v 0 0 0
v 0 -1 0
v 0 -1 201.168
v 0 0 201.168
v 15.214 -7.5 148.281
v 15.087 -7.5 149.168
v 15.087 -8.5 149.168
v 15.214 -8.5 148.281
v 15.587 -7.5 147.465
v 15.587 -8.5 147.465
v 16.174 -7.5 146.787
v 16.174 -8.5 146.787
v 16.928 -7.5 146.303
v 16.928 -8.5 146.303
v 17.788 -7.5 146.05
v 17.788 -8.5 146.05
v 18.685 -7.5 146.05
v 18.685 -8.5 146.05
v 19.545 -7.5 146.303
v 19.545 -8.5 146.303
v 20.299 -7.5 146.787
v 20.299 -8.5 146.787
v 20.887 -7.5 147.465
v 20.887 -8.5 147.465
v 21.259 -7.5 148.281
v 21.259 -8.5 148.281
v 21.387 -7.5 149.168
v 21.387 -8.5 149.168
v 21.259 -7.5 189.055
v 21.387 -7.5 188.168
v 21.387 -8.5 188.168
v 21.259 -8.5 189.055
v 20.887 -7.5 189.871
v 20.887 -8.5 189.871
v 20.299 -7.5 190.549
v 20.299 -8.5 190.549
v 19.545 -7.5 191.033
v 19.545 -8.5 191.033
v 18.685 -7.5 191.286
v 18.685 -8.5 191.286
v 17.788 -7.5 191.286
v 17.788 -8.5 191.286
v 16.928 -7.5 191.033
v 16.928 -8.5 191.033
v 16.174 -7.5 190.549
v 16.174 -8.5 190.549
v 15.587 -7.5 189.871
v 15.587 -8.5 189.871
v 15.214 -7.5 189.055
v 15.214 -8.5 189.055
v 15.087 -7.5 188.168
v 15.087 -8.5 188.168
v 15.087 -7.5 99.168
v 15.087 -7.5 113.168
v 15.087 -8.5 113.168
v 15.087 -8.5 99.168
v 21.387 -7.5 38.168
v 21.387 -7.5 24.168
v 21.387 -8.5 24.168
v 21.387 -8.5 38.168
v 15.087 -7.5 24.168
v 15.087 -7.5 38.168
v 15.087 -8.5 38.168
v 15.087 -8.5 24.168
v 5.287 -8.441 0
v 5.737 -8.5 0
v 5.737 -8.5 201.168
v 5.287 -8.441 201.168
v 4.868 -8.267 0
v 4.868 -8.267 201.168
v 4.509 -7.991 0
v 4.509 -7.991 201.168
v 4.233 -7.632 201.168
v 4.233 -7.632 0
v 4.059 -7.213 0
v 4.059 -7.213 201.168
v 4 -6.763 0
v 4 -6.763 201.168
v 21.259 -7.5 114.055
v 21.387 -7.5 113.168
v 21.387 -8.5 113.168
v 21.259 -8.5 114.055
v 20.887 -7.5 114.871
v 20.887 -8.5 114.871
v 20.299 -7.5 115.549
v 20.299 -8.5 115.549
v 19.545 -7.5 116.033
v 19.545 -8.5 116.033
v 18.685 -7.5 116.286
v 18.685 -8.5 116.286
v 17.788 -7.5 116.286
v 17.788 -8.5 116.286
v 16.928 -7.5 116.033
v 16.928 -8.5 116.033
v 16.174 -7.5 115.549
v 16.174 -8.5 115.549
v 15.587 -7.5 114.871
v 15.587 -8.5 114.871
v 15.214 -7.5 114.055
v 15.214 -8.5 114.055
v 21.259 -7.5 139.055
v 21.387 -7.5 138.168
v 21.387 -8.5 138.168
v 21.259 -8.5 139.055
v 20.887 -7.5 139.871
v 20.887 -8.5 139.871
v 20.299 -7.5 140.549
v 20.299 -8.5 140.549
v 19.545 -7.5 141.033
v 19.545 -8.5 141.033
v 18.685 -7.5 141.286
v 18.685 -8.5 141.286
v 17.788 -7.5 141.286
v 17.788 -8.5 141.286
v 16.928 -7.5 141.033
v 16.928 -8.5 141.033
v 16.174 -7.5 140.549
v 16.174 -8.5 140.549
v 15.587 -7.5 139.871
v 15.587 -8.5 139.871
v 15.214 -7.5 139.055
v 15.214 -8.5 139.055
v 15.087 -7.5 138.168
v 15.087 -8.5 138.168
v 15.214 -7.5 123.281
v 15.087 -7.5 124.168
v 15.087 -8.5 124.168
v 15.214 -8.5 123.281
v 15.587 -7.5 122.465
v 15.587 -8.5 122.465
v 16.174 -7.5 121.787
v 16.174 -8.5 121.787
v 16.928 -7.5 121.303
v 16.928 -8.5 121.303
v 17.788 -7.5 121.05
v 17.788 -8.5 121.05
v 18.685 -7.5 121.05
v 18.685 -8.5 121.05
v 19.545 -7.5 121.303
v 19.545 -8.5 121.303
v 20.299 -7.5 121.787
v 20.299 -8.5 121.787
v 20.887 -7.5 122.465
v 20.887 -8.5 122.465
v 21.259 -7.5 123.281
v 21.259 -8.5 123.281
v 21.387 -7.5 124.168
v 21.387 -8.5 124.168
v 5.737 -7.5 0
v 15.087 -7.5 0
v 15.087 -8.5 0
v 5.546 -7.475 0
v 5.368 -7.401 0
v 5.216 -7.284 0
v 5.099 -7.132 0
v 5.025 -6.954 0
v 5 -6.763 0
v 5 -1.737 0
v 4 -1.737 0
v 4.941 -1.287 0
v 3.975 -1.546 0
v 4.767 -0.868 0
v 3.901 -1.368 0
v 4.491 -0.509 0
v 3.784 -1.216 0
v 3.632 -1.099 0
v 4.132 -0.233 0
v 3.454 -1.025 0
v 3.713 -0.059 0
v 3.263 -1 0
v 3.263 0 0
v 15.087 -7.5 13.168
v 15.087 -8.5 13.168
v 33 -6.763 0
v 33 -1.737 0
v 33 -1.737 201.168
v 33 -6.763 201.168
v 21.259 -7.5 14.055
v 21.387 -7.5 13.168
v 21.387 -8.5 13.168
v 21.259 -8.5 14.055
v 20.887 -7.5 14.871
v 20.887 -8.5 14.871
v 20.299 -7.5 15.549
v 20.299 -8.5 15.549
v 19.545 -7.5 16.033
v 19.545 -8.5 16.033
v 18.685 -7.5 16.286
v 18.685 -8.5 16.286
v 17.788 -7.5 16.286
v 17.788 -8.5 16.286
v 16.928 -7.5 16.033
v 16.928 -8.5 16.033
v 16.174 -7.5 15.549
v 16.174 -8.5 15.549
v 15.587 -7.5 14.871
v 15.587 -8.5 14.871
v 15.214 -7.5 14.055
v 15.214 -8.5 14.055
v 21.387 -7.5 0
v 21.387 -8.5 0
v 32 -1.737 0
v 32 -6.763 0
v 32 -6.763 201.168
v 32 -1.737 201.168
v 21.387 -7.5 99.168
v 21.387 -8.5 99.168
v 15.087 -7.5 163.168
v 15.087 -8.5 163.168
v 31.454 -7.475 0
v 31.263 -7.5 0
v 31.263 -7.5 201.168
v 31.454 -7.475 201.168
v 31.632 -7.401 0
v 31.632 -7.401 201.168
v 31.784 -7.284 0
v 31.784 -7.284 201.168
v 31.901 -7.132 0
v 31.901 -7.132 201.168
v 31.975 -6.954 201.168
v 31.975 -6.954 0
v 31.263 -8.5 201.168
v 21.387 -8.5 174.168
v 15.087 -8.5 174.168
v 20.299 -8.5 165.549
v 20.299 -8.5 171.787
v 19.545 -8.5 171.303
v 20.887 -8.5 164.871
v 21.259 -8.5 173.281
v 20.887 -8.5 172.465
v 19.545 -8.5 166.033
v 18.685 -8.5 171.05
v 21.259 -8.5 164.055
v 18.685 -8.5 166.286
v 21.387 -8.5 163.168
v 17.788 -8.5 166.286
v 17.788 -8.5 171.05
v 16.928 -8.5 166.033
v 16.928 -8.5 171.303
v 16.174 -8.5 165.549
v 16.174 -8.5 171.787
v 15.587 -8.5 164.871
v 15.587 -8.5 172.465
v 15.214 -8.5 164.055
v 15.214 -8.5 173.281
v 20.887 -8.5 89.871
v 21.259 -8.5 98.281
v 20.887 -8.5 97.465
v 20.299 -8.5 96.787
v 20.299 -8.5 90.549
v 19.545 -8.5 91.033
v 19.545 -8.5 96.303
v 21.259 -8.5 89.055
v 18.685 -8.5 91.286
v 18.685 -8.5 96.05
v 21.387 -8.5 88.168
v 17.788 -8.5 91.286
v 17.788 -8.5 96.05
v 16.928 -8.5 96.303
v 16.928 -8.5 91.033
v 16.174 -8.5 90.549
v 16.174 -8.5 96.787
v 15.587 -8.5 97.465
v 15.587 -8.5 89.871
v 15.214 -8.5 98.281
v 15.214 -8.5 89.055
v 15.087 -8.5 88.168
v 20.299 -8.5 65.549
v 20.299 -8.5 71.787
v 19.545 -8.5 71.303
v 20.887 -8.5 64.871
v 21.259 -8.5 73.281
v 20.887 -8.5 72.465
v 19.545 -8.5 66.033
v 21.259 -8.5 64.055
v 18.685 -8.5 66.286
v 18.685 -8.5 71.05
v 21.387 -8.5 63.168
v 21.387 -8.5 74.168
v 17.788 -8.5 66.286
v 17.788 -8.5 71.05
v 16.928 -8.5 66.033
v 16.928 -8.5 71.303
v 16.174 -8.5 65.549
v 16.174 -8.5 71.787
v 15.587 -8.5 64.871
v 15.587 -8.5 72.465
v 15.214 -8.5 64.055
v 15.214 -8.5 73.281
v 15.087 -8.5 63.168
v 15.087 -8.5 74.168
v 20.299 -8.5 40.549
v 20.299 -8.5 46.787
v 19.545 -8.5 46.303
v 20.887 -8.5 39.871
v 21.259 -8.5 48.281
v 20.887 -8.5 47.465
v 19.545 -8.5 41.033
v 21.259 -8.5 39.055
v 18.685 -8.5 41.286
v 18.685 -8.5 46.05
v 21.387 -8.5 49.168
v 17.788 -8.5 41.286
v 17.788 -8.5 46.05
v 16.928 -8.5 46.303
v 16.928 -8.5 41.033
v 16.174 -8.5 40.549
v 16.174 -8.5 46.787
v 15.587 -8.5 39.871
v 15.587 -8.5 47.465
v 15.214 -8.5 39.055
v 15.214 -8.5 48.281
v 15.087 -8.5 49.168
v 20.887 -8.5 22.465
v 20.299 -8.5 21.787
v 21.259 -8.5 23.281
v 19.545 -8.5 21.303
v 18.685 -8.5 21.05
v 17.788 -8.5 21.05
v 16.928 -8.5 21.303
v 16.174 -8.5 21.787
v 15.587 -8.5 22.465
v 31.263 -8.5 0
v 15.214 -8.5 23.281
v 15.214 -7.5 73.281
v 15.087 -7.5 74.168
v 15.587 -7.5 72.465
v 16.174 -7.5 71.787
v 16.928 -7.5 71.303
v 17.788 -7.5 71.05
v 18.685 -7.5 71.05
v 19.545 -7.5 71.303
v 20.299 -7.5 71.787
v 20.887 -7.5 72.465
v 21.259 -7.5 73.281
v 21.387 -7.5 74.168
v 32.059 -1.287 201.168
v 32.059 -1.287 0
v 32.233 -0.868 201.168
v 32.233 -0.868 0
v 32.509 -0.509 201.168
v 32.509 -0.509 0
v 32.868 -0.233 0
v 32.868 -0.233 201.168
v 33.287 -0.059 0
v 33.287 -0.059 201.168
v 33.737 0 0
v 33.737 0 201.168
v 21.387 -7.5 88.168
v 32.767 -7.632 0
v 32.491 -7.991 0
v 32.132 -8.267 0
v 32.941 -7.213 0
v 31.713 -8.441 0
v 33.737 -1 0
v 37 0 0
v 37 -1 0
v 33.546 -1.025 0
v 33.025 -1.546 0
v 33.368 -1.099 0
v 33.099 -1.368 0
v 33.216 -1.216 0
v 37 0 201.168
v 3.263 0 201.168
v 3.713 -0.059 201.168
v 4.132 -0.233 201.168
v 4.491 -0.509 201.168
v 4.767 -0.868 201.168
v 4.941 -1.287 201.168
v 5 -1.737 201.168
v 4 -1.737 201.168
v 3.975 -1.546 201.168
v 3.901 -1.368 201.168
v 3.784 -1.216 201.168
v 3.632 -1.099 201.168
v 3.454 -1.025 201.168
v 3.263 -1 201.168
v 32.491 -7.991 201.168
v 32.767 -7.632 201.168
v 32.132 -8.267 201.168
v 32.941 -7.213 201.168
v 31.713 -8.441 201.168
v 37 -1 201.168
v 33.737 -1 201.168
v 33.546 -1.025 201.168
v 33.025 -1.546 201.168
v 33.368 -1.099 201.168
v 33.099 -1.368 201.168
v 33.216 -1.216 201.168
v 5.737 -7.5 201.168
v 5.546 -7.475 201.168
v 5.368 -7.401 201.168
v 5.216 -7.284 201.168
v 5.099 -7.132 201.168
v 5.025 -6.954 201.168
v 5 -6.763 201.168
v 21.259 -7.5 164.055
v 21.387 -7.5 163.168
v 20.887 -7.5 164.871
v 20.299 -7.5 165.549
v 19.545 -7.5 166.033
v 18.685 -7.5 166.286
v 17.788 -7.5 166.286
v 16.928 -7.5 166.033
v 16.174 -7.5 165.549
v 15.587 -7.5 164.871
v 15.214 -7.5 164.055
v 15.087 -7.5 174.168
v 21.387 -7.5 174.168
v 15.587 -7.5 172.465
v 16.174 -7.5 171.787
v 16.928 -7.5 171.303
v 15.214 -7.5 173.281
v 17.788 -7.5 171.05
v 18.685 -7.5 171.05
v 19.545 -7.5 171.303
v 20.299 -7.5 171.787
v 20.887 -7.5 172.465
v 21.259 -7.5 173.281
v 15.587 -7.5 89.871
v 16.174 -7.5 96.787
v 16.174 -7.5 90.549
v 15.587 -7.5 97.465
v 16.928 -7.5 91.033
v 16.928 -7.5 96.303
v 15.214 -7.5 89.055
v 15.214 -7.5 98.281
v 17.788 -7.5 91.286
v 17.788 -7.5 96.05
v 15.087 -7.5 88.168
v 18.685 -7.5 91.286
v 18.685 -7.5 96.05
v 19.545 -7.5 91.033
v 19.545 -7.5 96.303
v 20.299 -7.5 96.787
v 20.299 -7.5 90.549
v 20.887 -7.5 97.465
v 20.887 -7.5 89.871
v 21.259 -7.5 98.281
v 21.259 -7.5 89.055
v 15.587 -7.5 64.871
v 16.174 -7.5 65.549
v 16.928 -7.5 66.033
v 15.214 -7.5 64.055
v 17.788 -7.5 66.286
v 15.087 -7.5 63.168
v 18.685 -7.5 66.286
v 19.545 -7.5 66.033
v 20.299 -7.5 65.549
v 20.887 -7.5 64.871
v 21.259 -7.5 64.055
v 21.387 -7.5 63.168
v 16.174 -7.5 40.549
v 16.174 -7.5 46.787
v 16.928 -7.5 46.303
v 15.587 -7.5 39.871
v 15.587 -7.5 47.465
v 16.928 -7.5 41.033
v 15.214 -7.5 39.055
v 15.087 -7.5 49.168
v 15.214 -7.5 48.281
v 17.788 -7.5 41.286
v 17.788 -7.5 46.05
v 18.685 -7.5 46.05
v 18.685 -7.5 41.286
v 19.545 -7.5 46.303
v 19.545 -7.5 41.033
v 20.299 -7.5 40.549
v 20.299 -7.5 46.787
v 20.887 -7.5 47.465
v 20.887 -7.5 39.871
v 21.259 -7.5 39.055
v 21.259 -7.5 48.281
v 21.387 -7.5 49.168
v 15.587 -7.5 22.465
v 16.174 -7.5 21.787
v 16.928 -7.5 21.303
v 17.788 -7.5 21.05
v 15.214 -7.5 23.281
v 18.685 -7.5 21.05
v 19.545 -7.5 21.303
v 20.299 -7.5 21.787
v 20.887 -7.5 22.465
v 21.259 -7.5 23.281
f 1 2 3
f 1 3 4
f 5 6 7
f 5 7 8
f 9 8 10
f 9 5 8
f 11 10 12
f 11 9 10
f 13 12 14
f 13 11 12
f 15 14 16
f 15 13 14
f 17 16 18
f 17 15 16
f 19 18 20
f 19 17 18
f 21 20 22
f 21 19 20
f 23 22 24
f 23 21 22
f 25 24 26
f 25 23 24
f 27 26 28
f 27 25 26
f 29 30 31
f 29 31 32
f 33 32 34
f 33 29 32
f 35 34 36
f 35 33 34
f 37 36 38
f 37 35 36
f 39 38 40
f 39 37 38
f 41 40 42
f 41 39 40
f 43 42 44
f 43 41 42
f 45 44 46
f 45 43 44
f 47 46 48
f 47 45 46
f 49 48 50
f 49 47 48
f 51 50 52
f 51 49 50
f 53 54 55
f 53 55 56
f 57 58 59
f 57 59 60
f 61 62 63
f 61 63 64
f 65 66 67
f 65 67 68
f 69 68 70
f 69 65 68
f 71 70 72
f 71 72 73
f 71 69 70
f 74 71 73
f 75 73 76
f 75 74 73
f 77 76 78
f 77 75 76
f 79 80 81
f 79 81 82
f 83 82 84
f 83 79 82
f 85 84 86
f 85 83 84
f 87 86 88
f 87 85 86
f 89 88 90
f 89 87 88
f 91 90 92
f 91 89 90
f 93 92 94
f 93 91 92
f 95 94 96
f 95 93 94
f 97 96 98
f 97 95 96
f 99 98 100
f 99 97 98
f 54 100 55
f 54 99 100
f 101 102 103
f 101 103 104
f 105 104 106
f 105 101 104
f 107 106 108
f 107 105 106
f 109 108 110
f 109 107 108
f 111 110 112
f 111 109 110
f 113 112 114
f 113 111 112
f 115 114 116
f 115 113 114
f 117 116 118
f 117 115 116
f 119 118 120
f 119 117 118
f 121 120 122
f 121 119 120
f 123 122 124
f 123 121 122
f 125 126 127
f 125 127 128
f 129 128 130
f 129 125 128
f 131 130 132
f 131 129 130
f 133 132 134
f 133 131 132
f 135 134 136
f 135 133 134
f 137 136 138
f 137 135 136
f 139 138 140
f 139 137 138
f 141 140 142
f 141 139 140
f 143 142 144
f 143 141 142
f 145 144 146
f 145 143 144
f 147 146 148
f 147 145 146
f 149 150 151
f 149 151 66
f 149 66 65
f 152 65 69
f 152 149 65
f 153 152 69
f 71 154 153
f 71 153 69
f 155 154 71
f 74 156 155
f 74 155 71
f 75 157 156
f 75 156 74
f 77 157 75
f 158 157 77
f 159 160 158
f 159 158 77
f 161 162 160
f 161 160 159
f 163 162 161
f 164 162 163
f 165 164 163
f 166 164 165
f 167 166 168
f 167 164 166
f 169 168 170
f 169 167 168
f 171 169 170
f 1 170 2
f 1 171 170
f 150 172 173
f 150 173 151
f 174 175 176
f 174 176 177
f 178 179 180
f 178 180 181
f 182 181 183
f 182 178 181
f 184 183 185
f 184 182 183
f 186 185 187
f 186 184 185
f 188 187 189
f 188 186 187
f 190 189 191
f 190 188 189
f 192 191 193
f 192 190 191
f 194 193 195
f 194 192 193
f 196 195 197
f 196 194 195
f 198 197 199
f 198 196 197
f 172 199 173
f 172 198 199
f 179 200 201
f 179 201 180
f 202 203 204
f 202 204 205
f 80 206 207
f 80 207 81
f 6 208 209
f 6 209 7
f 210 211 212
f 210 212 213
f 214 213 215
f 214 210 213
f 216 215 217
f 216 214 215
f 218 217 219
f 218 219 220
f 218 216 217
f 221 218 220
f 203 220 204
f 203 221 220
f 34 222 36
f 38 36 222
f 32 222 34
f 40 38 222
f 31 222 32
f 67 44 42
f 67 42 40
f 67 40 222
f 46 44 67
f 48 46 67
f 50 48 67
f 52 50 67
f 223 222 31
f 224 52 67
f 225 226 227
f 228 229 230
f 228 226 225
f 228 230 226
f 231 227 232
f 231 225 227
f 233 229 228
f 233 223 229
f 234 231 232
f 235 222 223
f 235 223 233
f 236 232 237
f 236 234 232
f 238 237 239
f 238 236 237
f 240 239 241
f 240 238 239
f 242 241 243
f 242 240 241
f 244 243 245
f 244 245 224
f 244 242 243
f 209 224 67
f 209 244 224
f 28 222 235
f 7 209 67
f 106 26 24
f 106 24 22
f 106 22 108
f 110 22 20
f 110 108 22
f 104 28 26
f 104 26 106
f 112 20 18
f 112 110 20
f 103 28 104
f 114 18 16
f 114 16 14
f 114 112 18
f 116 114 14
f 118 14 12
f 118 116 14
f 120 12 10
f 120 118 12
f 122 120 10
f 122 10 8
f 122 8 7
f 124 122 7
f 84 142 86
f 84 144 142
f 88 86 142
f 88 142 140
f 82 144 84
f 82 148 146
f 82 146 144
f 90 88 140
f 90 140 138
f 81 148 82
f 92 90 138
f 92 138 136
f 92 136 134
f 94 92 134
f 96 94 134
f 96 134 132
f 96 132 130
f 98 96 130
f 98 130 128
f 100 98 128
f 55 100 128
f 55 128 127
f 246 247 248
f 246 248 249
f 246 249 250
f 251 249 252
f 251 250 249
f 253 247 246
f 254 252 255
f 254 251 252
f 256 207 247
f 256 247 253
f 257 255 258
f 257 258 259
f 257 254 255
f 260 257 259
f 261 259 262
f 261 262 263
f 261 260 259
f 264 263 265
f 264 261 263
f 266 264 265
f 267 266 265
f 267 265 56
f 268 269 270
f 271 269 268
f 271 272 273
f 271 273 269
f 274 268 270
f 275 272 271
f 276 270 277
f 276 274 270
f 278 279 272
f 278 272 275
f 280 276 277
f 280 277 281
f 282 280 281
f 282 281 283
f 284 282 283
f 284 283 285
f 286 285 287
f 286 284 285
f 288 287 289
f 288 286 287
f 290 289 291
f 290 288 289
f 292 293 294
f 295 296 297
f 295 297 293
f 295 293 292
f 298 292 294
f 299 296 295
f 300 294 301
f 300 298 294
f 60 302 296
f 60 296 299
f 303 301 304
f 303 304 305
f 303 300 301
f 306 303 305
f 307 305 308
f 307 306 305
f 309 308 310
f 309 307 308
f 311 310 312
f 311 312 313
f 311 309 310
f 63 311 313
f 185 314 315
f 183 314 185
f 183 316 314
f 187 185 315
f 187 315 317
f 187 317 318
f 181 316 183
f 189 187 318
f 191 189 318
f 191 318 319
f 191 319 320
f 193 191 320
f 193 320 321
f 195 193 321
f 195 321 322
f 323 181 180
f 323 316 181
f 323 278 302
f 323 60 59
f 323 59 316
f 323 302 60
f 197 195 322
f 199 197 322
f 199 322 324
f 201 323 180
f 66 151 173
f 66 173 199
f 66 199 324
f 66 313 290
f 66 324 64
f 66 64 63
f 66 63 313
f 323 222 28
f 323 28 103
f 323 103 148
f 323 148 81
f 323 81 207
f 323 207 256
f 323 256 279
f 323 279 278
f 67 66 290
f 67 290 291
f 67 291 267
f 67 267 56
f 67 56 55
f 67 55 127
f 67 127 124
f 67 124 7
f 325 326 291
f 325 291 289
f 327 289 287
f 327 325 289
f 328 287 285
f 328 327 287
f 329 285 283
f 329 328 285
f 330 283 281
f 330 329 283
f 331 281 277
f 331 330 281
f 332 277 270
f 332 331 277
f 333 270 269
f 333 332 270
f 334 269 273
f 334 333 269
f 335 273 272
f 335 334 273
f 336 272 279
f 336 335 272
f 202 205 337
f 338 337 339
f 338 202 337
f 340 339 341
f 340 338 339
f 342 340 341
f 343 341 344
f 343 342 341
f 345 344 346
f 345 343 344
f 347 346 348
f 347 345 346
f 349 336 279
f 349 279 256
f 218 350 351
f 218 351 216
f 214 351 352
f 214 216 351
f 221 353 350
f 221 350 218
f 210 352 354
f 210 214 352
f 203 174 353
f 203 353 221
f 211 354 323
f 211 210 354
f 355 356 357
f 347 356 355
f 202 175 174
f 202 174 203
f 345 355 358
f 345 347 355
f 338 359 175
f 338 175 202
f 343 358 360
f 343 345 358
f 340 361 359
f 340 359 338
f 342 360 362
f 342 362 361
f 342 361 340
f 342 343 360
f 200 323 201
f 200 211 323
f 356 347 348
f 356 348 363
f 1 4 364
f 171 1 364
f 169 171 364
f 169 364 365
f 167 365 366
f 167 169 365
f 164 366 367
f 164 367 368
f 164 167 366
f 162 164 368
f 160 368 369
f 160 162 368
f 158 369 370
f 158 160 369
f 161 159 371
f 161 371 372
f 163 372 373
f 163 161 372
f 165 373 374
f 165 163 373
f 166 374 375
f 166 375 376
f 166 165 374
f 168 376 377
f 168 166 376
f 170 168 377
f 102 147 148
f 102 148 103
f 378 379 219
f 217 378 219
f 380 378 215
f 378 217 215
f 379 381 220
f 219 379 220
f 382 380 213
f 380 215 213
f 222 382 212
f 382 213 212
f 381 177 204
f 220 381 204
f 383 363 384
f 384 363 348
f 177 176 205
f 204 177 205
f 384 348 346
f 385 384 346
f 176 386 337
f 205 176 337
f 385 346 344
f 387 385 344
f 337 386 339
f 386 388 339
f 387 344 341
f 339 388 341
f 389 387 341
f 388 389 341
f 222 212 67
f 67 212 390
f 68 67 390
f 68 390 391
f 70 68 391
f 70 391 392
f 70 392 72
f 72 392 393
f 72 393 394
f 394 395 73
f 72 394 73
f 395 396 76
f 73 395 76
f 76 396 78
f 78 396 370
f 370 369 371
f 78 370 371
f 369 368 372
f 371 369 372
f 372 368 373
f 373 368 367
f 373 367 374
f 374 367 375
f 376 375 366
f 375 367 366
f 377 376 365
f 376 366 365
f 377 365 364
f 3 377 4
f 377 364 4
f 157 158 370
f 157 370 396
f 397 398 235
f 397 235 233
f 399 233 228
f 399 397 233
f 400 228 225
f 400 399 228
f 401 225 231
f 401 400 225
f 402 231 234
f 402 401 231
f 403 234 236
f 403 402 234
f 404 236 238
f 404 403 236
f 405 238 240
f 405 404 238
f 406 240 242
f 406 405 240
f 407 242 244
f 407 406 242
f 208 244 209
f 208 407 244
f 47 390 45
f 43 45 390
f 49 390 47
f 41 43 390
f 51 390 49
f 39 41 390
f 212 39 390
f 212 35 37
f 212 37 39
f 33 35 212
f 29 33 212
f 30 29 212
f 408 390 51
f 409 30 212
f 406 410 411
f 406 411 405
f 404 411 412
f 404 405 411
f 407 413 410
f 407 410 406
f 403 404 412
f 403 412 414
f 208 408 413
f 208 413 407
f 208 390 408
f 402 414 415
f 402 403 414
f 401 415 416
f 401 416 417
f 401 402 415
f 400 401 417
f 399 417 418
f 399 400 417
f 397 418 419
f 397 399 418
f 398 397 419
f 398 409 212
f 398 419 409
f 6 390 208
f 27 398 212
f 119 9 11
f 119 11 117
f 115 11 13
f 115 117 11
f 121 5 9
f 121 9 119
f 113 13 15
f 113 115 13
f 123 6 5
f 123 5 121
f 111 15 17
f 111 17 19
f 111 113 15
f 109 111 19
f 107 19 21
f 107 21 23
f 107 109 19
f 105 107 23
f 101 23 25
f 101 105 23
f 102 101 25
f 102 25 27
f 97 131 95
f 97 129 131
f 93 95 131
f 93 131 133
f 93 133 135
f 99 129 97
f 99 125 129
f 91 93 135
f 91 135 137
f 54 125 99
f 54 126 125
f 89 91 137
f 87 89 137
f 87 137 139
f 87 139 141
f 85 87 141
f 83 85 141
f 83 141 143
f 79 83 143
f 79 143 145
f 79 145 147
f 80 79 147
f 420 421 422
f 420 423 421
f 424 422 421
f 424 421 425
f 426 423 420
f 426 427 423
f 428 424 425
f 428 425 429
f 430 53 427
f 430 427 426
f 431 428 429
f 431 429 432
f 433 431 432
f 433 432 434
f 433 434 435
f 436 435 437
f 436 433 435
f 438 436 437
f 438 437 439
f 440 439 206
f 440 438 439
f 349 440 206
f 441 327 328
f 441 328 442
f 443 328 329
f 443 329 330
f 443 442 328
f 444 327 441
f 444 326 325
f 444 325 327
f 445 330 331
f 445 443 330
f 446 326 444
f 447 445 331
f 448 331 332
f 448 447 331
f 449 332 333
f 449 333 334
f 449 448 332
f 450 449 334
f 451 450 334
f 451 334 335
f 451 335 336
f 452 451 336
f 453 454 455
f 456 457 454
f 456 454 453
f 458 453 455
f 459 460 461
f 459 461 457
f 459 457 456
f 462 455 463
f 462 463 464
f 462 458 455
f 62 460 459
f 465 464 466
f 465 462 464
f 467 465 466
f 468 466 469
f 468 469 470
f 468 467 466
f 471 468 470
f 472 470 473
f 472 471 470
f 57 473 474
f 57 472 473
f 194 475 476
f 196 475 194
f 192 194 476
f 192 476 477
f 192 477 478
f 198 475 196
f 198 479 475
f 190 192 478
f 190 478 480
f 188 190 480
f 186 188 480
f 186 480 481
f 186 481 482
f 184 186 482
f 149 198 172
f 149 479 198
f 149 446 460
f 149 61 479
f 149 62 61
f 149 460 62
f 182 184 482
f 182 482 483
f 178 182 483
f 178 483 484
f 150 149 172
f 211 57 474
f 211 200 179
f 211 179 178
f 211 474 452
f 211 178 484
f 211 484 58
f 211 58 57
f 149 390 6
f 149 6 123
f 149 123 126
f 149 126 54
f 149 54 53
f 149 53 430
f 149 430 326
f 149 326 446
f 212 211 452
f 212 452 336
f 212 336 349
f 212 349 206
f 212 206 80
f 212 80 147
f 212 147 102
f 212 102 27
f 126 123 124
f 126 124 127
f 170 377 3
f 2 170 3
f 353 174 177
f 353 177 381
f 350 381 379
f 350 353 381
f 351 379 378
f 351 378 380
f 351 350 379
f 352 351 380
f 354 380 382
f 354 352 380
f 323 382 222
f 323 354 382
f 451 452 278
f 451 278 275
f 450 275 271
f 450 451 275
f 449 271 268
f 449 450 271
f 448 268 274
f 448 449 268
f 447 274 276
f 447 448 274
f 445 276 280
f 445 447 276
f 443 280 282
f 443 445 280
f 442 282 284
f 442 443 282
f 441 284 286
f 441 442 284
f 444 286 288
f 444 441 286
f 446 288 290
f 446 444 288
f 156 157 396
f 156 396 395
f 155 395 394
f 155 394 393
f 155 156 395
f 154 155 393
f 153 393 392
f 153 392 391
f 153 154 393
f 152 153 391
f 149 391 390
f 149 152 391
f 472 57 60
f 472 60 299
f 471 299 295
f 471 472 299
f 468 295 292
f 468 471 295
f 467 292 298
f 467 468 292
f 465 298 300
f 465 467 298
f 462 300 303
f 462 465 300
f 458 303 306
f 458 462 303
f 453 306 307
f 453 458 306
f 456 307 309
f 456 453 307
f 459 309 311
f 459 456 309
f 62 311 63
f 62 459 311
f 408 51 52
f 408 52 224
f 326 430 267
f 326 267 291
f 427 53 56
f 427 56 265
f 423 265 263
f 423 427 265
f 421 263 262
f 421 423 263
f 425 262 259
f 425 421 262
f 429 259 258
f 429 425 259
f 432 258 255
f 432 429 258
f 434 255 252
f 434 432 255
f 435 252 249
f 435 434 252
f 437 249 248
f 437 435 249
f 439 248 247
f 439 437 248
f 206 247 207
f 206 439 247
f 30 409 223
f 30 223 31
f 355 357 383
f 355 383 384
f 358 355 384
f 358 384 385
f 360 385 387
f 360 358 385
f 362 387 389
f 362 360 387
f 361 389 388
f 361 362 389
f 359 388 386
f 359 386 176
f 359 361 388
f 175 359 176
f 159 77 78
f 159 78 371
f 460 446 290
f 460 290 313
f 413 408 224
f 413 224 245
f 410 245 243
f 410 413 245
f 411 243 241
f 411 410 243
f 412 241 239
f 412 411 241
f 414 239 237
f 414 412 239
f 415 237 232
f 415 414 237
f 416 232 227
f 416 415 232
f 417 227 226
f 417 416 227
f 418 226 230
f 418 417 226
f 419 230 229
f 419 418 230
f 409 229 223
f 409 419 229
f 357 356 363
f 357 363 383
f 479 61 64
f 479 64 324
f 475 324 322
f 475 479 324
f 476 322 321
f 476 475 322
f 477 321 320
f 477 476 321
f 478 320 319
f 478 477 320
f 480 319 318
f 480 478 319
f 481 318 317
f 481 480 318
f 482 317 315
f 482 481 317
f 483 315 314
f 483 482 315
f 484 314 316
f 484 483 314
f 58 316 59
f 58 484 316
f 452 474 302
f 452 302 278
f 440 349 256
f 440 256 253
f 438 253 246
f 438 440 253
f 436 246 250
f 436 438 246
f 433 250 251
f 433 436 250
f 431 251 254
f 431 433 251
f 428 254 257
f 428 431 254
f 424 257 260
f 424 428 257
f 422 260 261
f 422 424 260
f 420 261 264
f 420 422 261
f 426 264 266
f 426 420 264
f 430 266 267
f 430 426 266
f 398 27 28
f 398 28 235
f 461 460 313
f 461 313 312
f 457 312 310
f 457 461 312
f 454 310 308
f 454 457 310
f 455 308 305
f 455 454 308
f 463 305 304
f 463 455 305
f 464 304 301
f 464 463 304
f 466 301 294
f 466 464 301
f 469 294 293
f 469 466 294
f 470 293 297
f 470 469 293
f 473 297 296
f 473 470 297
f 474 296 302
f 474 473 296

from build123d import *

# Parameters (mm, degrees)
BASE_FLANGE1_DEPTH = 201.168
CUT_EXTRUDE1_DEPTH = 10
LPATTERN1_COUNT    = 11
LPATTERN1_PITCH    = 25


# Sheet-metal steps are written as plain solids
with BuildPart() as part:
    # Sketch1 → Base-Flange1 (new body)
    with BuildSketch(Plane.XY):
        with BuildLine():
            Line((0, 0), (3.2634, 0))
            ThreePointArc((3.2634, 0), (4.491361636, -0.508638364), (5, -1.7366))
            Line((5, -1.7366), (5, -6.7634))
            ThreePointArc((5, -6.7634), (5.215745145, -7.284254855), (5.7366, -7.5))
            Line((5.7366, -7.5), (31.2634, -7.5))
            ThreePointArc((31.2634, -7.5), (31.784254855, -7.284254855), (32, -6.7634))
            Line((32, -6.7634), (32, -1.7366))
            ThreePointArc((32, -1.7366), (32.508638364, -0.508638364), (33.7366, 0))
            Line((33.7366, 0), (37, 0))
            Line((37, 0), (37, -1))
            Line((37, -1), (33.7366, -1))
            ThreePointArc((33.7366, -1), (33.215745145, -1.215745145), (33, -1.7366))
            Line((33, -1.7366), (33, -6.7634))
            ThreePointArc((33, -6.7634), (32.491361636, -7.991361636), (31.2634, -8.5))
            Line((31.2634, -8.5), (5.7366, -8.5))
            ThreePointArc((5.7366, -8.5), (4.508638364, -7.991361636), (4, -6.7634))
            Line((4, -6.7634), (4, -1.7366))
            ThreePointArc((4, -1.7366), (3.784254855, -1.215745145), (3.2634, -1))
            Line((3.2634, -1), (0, -1))
            Line((0, -1), (0, 0))
        make_face()
    extrude(amount=BASE_FLANGE1_DEPTH)

    # Sketch6 → Cut-Extrude1 (cut)
    with BuildSketch(Plane(origin=(0, -7.5, 0), x_dir=(1, 0, 0), z_dir=(0, 1, 0))):
        with BuildLine():
            Line((21.3866, -174.168), (21.3866, -188.168))
            ThreePointArc((21.3866, -188.168), (18.2366, -191.318), (15.0866, -188.168))
            Line((15.0866, -188.168), (15.0866, -174.168))
            ThreePointArc((15.0866, -174.168), (18.2366, -171.018), (21.3866, -174.168))
        make_face()
    cut_extrude1 = extrude(amount=-CUT_EXTRUDE1_DEPTH, mode=Mode.SUBTRACT)

    # LPattern1: Cut-Extrude1 ×11
    with Locations(*[(0, 0, -i * LPATTERN1_PITCH) for i in range(1, LPATTERN1_COUNT)]):
        add(cut_extrude1, mode=Mode.SUBTRACT)


solid = part.part
